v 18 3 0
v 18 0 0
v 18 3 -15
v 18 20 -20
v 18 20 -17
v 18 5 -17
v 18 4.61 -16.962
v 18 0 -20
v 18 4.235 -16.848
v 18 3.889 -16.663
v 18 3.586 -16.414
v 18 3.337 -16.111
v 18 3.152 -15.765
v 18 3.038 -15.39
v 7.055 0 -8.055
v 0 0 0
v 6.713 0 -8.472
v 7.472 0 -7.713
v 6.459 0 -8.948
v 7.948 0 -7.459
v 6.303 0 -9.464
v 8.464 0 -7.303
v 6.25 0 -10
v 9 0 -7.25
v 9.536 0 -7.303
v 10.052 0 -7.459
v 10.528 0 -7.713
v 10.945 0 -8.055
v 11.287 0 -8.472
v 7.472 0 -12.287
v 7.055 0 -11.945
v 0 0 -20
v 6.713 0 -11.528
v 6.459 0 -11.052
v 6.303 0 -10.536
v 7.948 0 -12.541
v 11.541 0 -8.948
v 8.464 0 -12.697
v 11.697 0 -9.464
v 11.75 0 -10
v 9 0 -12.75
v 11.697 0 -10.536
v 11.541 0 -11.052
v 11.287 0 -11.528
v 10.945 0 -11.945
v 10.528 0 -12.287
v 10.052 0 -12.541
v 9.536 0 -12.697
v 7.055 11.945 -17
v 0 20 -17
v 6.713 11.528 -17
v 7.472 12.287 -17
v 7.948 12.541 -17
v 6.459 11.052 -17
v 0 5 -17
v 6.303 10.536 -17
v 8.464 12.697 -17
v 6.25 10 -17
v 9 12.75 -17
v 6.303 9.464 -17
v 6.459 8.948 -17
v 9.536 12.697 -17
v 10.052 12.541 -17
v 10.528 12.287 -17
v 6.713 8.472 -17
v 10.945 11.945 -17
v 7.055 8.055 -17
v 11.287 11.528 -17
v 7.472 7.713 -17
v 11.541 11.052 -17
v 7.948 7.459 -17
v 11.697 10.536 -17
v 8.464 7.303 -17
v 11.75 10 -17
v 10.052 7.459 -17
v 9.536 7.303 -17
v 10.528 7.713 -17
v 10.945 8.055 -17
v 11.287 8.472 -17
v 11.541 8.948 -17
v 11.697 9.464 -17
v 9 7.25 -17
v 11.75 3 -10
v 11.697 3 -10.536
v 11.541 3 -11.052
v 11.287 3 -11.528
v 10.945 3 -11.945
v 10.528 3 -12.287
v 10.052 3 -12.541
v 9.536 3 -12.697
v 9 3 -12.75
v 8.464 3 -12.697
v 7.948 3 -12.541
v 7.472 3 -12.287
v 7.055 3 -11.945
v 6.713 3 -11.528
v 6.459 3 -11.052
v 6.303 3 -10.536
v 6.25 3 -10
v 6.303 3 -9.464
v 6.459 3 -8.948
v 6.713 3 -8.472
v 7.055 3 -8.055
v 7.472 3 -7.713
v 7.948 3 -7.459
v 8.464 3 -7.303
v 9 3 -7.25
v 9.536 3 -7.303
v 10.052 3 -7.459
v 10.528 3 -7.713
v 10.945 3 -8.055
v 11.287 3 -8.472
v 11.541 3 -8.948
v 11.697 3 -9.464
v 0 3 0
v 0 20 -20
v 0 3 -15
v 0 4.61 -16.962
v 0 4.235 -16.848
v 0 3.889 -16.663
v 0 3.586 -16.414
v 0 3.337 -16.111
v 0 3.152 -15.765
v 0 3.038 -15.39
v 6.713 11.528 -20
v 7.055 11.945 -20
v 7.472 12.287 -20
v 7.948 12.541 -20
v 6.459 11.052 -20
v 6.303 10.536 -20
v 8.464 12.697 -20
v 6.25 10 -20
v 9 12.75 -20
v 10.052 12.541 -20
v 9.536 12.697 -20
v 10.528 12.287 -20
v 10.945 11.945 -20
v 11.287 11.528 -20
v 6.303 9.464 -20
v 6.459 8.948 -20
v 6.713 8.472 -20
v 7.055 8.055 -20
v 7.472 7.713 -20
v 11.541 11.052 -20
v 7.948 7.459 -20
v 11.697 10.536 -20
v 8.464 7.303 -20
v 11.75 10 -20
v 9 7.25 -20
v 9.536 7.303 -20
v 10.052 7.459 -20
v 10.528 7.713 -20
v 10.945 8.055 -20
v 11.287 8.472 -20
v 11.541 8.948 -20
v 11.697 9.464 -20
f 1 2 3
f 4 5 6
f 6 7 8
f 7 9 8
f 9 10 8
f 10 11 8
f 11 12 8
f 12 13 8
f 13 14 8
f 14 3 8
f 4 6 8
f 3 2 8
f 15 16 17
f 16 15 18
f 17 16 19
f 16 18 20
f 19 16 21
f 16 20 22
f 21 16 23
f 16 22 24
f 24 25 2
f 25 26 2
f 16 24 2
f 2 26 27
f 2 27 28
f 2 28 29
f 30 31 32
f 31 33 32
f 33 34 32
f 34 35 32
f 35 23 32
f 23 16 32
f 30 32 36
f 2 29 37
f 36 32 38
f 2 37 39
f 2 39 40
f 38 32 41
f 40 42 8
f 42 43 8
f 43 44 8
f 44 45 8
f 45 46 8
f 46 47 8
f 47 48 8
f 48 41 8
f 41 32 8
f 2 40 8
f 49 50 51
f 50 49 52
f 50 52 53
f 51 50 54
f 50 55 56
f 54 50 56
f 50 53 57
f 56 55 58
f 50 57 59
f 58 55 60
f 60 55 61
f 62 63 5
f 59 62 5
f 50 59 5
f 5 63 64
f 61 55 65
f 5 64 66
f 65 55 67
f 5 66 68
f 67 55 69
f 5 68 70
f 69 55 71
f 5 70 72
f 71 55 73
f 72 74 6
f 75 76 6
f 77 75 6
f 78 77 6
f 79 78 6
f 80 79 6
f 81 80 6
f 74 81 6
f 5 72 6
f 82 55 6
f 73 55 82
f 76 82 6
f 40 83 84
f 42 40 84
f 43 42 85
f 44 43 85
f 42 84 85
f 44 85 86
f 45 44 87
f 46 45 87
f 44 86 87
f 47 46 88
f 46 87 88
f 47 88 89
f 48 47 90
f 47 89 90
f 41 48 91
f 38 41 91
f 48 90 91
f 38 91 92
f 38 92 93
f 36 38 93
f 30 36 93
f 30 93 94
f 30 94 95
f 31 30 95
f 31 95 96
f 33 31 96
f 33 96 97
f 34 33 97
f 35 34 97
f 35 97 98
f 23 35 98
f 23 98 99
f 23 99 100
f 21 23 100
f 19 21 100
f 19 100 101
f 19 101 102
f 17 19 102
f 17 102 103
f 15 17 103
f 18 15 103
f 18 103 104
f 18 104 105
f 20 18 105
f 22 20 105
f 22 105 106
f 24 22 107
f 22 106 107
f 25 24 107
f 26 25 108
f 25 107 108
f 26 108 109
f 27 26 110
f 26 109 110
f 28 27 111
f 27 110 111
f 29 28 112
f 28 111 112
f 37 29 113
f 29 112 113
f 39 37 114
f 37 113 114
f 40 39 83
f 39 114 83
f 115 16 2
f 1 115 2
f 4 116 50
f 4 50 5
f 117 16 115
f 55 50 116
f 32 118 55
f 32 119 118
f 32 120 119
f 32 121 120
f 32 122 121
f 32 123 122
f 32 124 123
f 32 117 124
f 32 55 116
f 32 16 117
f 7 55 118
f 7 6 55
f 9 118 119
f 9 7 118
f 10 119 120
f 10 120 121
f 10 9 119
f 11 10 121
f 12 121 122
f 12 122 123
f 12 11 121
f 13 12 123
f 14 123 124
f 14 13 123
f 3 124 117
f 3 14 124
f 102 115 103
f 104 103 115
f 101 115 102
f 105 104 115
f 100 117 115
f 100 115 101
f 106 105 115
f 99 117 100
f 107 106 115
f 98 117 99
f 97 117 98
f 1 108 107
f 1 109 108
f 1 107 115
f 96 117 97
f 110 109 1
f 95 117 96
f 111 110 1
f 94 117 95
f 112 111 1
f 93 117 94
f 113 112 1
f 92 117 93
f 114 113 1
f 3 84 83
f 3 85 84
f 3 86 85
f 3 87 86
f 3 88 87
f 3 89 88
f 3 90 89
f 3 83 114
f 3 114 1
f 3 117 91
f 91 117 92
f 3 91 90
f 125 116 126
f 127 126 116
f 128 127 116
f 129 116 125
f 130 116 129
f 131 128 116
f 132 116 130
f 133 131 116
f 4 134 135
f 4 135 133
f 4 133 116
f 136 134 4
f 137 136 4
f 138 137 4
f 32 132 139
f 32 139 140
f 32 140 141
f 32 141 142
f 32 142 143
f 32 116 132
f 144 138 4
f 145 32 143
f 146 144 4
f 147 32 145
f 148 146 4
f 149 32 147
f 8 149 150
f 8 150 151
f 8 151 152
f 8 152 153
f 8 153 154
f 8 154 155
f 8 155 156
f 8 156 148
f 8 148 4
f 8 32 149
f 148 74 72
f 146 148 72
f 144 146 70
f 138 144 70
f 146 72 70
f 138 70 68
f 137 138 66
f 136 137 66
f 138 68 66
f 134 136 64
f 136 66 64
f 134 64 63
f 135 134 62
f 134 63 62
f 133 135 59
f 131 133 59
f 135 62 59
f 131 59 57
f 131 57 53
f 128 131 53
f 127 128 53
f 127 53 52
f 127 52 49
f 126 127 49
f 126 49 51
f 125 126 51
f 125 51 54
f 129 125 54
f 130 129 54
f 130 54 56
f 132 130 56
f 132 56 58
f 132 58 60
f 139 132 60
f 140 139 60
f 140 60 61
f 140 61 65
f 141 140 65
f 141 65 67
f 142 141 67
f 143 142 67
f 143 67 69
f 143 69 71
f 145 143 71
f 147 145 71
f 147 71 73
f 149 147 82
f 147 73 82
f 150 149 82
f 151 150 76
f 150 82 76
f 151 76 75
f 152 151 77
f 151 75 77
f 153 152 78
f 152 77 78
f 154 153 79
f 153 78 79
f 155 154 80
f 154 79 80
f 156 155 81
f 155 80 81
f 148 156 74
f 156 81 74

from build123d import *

# Parameters (mm, degrees)
SKETCH_1_W      = 18
SKETCH_1_H      = 20
EXTRUDE_1_DEPTH = 3
SKETCH_2_W      = 18
SKETCH_2_H      = 3
EXTRUDE_2_DEPTH = 17
HOLE_WIZARD_1_D = 5.5
HOLE_WIZARD_2_D = 5.5
FILLET_1_R      = 2


with BuildPart() as part:
    # 草图1 → 凸台-拉伸1 (new body)
    with BuildSketch(Plane(origin=(0, 0, 0), x_dir=(1, 0, 0), z_dir=(0, 1, 0))):
        with Locations((9, 10)):
            Rectangle(SKETCH_1_W, SKETCH_1_H)
    extrude(amount=EXTRUDE_1_DEPTH)

    # 草图2 → 凸台-拉伸2 (add)
    with BuildSketch(Plane(origin=(0, 3, 0), x_dir=(1, 0, 0), z_dir=(0, 1, 0))):
        with Locations((9, 18.5)):
            Rectangle(SKETCH_2_W, SKETCH_2_H)
    extrude(amount=EXTRUDE_2_DEPTH)

    # 孔1 (through all)
    with Locations(Plane(origin=(0, 0, 0), x_dir=(-1, 0, 0), z_dir=(0, -1, 0))):
        with Locations((-9, 10)):
            Hole(HOLE_WIZARD_1_D / 2)

    # 孔2 (through all)
    with Locations(Plane(origin=(0, 0, -20), x_dir=(-1, 0, 0), z_dir=(0, 0, -1))):
        with Locations((-9, 10)):
            Hole(HOLE_WIZARD_2_D / 2)

    # 圆角1
    fillet_1_edges = [part.edges().sort_by_distance(p)[0] for p in [
        (9, 3, -17),
    ]]
    fillet(fillet_1_edges, radius=FILLET_1_R)


solid = part.part
